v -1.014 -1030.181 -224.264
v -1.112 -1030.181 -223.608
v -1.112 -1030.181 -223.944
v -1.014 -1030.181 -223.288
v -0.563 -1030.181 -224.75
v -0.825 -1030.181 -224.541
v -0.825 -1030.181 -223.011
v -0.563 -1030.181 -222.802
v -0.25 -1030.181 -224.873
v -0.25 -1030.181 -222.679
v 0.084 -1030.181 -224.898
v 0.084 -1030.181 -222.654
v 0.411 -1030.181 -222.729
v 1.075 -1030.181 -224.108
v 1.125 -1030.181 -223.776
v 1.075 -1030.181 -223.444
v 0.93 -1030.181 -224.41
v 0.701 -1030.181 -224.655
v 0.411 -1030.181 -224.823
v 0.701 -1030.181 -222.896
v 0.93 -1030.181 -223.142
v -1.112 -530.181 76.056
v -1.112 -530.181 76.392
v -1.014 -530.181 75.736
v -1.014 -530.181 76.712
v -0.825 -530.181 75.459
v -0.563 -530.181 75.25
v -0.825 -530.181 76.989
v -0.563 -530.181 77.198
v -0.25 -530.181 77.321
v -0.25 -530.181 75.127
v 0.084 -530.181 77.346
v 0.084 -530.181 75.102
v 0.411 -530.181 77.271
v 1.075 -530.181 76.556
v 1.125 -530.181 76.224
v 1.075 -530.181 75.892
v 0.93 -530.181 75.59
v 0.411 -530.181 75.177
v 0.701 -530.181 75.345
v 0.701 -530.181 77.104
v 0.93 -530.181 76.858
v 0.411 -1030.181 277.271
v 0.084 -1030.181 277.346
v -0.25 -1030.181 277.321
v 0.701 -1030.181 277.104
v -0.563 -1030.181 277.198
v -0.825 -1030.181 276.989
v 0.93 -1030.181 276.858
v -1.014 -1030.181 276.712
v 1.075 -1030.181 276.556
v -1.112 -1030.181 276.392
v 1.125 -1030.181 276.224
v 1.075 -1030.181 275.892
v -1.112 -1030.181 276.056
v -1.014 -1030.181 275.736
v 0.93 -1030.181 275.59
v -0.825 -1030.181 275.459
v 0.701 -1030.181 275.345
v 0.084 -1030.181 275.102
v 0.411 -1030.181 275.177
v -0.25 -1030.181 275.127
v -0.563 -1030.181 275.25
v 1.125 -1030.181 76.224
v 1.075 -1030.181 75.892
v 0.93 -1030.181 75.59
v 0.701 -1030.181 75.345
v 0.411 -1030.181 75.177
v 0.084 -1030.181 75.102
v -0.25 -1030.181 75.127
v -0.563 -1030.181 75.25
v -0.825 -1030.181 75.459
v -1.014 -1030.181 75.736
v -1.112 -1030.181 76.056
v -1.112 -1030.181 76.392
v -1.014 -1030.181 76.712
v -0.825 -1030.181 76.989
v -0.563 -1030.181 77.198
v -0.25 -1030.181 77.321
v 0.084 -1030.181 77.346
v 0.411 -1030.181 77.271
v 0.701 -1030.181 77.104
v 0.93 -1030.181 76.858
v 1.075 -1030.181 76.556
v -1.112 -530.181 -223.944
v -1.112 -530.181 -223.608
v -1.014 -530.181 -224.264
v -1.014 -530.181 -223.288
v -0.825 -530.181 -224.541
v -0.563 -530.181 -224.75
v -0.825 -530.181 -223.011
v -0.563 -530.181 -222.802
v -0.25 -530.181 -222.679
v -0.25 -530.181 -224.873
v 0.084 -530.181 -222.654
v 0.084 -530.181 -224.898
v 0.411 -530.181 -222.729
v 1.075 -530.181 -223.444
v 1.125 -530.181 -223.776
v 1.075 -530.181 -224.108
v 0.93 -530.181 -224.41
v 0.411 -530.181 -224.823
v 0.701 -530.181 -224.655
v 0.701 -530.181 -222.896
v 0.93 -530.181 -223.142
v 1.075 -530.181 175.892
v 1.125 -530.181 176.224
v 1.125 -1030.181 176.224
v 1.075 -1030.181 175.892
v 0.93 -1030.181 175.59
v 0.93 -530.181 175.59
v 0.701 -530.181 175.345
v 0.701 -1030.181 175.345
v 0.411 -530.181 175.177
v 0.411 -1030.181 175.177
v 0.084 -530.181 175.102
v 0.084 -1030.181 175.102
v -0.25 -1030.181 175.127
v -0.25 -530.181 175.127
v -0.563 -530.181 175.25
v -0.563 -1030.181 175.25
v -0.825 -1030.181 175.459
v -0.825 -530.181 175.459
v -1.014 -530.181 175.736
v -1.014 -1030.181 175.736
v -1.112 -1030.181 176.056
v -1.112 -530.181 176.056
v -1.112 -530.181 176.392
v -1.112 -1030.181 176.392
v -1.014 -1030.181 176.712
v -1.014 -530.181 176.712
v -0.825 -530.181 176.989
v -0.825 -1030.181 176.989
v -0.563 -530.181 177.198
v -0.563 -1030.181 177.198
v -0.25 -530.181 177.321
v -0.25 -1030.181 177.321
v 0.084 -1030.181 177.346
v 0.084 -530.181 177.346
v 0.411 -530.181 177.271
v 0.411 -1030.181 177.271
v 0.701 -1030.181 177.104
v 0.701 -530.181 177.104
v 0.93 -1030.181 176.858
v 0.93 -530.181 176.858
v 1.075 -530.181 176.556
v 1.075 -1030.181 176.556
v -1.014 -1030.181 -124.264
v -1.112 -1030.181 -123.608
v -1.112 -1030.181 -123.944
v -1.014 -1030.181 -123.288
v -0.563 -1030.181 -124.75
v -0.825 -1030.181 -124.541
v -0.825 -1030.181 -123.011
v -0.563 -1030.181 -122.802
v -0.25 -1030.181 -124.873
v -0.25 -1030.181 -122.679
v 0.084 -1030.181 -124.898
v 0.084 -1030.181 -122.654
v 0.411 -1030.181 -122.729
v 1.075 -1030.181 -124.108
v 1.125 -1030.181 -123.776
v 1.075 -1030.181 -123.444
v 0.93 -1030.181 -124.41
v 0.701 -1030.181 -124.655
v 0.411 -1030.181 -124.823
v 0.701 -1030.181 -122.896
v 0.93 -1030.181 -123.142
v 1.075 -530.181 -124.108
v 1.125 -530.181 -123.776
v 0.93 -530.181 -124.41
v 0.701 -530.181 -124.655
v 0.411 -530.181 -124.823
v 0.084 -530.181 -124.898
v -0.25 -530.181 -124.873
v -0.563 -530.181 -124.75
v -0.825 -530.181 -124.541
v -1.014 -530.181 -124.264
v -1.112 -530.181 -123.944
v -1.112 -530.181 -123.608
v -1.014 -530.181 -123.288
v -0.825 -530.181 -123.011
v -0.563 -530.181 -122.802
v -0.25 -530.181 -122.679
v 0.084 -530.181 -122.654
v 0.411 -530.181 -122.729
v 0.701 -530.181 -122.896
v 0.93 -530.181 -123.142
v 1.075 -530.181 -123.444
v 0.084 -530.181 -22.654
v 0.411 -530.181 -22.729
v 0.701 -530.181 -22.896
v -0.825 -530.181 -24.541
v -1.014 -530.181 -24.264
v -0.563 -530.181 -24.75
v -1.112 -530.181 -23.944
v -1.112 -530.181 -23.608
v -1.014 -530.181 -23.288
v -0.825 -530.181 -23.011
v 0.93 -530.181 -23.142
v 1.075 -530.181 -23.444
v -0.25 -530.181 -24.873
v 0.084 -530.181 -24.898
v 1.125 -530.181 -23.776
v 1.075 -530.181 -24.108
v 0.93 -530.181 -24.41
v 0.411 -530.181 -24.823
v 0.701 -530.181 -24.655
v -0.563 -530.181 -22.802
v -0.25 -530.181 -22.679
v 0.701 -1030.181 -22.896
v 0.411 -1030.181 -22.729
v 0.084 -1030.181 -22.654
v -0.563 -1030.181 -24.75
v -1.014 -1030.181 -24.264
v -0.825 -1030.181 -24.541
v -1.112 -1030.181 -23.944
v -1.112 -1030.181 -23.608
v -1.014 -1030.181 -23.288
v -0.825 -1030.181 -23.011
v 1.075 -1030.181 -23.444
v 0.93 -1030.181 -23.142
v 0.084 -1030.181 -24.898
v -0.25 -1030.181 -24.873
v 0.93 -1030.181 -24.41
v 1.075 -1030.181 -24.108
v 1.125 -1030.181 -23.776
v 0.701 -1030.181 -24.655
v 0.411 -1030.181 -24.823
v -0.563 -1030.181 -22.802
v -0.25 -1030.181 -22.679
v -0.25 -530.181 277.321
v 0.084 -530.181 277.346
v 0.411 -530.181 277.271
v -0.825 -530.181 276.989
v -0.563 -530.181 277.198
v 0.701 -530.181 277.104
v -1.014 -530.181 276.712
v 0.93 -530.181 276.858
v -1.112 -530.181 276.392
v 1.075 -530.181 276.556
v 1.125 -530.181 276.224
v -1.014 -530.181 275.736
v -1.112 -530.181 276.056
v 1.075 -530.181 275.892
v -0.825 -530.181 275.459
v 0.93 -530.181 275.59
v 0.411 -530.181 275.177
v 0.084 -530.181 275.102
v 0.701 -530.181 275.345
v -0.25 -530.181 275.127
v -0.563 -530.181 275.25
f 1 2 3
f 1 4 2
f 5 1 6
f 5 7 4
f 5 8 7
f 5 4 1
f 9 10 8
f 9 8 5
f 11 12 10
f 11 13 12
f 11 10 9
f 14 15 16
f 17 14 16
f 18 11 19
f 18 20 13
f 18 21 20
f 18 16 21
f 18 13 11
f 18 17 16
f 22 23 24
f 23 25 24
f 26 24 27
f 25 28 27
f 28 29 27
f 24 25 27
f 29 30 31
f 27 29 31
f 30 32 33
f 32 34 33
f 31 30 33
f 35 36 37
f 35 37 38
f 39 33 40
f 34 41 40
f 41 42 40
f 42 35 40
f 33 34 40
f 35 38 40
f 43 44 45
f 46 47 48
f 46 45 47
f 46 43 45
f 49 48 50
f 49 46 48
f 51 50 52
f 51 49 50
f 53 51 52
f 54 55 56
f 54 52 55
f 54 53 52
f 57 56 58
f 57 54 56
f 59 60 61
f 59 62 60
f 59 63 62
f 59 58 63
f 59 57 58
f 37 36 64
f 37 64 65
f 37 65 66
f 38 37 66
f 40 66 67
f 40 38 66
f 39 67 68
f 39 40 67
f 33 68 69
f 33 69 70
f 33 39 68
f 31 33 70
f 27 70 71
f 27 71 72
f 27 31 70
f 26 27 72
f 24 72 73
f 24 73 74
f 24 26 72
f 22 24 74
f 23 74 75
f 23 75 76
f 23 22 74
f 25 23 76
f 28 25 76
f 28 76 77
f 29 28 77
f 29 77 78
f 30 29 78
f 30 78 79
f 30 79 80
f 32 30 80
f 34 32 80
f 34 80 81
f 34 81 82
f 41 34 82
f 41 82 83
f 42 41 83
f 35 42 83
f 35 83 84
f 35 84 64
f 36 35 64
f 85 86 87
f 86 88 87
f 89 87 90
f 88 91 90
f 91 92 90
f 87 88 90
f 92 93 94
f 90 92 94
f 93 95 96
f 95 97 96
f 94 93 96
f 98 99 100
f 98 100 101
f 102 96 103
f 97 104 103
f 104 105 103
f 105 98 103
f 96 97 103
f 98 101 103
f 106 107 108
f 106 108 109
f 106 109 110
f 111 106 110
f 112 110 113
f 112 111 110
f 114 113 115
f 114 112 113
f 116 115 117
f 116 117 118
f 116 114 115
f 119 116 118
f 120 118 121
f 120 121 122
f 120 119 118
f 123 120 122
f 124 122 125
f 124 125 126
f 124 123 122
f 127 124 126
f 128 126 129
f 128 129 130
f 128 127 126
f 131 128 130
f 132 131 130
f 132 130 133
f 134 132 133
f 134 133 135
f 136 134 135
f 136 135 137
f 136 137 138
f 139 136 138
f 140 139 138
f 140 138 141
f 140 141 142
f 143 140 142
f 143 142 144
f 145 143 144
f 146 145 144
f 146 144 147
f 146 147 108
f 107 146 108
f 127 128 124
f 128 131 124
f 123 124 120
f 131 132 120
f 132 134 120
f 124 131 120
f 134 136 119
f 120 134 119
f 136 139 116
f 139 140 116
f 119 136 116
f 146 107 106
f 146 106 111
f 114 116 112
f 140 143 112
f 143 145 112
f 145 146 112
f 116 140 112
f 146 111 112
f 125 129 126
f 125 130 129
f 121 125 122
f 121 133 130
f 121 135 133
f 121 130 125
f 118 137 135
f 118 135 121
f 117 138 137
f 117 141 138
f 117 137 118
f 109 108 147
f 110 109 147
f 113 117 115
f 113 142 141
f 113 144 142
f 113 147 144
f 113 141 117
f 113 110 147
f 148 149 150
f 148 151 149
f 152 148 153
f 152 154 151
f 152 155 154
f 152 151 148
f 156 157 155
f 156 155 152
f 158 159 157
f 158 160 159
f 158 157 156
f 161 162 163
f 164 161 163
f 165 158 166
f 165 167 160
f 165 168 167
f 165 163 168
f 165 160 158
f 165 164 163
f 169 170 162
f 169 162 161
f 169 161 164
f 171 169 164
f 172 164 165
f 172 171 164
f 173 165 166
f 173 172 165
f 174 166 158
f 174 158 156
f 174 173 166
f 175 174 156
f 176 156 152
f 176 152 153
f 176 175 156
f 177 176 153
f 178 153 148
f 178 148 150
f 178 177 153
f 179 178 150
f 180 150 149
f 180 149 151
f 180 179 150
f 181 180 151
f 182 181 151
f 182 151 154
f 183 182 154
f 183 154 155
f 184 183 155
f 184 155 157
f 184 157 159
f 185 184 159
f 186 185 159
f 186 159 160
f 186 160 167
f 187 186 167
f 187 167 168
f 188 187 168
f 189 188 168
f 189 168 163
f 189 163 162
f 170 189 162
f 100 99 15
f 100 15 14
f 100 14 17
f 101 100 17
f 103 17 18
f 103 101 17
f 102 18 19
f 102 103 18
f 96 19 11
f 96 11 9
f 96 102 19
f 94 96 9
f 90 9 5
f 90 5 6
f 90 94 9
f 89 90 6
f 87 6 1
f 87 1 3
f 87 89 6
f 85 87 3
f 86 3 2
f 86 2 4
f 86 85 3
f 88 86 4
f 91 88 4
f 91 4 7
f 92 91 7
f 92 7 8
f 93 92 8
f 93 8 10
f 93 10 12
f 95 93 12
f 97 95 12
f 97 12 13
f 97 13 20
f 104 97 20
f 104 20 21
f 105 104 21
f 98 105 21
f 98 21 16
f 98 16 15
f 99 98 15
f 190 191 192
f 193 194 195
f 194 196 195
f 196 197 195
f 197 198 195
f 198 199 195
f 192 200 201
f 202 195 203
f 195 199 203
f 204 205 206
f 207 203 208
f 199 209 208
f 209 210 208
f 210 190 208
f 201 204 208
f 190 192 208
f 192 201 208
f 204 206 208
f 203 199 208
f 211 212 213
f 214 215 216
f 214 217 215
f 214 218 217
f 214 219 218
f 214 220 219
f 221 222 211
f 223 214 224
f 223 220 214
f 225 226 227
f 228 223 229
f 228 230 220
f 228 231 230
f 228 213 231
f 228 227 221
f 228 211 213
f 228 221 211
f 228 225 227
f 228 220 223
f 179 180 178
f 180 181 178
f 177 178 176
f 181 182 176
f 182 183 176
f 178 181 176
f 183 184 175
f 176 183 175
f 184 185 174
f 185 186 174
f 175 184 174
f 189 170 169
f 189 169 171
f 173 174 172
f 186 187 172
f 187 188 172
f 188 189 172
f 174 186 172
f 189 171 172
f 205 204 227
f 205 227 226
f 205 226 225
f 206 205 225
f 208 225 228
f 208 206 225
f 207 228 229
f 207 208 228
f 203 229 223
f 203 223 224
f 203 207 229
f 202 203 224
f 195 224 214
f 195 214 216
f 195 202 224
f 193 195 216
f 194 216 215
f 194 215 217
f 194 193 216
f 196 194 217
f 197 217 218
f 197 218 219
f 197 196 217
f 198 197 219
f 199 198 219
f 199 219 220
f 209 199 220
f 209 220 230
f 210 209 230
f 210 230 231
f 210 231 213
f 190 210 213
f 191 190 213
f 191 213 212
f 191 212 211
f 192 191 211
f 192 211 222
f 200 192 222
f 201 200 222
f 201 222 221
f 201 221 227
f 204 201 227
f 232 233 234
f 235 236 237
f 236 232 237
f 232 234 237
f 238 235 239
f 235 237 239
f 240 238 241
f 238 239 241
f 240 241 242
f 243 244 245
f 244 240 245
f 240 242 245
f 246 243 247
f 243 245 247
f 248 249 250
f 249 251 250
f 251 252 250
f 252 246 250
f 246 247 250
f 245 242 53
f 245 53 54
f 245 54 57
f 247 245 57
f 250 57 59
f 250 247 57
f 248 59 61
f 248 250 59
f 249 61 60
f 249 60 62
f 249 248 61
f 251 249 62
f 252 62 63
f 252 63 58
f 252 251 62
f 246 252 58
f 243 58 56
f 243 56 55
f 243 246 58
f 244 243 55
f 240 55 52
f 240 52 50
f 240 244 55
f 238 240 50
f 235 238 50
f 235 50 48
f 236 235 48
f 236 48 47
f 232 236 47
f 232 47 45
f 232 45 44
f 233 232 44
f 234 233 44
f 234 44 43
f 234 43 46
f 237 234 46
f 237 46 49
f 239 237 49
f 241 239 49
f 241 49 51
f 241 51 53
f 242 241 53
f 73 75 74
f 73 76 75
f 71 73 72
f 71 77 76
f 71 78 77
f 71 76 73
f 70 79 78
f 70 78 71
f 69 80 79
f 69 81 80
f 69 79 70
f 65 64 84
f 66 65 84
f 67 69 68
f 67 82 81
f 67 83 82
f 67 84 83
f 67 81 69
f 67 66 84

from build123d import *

# Parameters (mm, degrees)
F2_R = 1.125


with BuildPart() as f3:
    # F3: sweep along a path in F0
    with BuildLine(Plane.YZ) as f3_path:
        Line((-1030.1807813505, 76.2240788737), (-530.1807813505, 76.2240788737))
    # F2 (on plane+point) → F3 (sweep)
    with BuildSketch(Plane.XZ.offset(530.1807813505)):
        with Locations((0, 76.2240788737)):
            Circle(F2_R)
    sweep(path=f3_path.line)

    # F4: sweep along a path in F0
    with BuildLine(Plane.YZ) as f4_path:
        Line((-1030.1807813505, 276.2240788737), (-530.1807813505, 276.2240788737))
    # F2 (on plane+point) → F4 (sweep)
    with BuildSketch(Plane.XZ.offset(530.1807813505)):
        with Locations((0, 276.2240788737)):
            Circle(F2_R)
        with Locations((0, 176.2240788737)):
            Circle(F2_R)
        with Locations((0, 76.2240788737)):
            Circle(F2_R)
        with Locations((0, -23.7759211263)):
            Circle(F2_R)
        with Locations((0, -123.7759211263)):
            Circle(F2_R)
        with Locations((0, -223.7759211263)):
            Circle(F2_R)
    sweep(path=f4_path.line)


solid = f3.part
